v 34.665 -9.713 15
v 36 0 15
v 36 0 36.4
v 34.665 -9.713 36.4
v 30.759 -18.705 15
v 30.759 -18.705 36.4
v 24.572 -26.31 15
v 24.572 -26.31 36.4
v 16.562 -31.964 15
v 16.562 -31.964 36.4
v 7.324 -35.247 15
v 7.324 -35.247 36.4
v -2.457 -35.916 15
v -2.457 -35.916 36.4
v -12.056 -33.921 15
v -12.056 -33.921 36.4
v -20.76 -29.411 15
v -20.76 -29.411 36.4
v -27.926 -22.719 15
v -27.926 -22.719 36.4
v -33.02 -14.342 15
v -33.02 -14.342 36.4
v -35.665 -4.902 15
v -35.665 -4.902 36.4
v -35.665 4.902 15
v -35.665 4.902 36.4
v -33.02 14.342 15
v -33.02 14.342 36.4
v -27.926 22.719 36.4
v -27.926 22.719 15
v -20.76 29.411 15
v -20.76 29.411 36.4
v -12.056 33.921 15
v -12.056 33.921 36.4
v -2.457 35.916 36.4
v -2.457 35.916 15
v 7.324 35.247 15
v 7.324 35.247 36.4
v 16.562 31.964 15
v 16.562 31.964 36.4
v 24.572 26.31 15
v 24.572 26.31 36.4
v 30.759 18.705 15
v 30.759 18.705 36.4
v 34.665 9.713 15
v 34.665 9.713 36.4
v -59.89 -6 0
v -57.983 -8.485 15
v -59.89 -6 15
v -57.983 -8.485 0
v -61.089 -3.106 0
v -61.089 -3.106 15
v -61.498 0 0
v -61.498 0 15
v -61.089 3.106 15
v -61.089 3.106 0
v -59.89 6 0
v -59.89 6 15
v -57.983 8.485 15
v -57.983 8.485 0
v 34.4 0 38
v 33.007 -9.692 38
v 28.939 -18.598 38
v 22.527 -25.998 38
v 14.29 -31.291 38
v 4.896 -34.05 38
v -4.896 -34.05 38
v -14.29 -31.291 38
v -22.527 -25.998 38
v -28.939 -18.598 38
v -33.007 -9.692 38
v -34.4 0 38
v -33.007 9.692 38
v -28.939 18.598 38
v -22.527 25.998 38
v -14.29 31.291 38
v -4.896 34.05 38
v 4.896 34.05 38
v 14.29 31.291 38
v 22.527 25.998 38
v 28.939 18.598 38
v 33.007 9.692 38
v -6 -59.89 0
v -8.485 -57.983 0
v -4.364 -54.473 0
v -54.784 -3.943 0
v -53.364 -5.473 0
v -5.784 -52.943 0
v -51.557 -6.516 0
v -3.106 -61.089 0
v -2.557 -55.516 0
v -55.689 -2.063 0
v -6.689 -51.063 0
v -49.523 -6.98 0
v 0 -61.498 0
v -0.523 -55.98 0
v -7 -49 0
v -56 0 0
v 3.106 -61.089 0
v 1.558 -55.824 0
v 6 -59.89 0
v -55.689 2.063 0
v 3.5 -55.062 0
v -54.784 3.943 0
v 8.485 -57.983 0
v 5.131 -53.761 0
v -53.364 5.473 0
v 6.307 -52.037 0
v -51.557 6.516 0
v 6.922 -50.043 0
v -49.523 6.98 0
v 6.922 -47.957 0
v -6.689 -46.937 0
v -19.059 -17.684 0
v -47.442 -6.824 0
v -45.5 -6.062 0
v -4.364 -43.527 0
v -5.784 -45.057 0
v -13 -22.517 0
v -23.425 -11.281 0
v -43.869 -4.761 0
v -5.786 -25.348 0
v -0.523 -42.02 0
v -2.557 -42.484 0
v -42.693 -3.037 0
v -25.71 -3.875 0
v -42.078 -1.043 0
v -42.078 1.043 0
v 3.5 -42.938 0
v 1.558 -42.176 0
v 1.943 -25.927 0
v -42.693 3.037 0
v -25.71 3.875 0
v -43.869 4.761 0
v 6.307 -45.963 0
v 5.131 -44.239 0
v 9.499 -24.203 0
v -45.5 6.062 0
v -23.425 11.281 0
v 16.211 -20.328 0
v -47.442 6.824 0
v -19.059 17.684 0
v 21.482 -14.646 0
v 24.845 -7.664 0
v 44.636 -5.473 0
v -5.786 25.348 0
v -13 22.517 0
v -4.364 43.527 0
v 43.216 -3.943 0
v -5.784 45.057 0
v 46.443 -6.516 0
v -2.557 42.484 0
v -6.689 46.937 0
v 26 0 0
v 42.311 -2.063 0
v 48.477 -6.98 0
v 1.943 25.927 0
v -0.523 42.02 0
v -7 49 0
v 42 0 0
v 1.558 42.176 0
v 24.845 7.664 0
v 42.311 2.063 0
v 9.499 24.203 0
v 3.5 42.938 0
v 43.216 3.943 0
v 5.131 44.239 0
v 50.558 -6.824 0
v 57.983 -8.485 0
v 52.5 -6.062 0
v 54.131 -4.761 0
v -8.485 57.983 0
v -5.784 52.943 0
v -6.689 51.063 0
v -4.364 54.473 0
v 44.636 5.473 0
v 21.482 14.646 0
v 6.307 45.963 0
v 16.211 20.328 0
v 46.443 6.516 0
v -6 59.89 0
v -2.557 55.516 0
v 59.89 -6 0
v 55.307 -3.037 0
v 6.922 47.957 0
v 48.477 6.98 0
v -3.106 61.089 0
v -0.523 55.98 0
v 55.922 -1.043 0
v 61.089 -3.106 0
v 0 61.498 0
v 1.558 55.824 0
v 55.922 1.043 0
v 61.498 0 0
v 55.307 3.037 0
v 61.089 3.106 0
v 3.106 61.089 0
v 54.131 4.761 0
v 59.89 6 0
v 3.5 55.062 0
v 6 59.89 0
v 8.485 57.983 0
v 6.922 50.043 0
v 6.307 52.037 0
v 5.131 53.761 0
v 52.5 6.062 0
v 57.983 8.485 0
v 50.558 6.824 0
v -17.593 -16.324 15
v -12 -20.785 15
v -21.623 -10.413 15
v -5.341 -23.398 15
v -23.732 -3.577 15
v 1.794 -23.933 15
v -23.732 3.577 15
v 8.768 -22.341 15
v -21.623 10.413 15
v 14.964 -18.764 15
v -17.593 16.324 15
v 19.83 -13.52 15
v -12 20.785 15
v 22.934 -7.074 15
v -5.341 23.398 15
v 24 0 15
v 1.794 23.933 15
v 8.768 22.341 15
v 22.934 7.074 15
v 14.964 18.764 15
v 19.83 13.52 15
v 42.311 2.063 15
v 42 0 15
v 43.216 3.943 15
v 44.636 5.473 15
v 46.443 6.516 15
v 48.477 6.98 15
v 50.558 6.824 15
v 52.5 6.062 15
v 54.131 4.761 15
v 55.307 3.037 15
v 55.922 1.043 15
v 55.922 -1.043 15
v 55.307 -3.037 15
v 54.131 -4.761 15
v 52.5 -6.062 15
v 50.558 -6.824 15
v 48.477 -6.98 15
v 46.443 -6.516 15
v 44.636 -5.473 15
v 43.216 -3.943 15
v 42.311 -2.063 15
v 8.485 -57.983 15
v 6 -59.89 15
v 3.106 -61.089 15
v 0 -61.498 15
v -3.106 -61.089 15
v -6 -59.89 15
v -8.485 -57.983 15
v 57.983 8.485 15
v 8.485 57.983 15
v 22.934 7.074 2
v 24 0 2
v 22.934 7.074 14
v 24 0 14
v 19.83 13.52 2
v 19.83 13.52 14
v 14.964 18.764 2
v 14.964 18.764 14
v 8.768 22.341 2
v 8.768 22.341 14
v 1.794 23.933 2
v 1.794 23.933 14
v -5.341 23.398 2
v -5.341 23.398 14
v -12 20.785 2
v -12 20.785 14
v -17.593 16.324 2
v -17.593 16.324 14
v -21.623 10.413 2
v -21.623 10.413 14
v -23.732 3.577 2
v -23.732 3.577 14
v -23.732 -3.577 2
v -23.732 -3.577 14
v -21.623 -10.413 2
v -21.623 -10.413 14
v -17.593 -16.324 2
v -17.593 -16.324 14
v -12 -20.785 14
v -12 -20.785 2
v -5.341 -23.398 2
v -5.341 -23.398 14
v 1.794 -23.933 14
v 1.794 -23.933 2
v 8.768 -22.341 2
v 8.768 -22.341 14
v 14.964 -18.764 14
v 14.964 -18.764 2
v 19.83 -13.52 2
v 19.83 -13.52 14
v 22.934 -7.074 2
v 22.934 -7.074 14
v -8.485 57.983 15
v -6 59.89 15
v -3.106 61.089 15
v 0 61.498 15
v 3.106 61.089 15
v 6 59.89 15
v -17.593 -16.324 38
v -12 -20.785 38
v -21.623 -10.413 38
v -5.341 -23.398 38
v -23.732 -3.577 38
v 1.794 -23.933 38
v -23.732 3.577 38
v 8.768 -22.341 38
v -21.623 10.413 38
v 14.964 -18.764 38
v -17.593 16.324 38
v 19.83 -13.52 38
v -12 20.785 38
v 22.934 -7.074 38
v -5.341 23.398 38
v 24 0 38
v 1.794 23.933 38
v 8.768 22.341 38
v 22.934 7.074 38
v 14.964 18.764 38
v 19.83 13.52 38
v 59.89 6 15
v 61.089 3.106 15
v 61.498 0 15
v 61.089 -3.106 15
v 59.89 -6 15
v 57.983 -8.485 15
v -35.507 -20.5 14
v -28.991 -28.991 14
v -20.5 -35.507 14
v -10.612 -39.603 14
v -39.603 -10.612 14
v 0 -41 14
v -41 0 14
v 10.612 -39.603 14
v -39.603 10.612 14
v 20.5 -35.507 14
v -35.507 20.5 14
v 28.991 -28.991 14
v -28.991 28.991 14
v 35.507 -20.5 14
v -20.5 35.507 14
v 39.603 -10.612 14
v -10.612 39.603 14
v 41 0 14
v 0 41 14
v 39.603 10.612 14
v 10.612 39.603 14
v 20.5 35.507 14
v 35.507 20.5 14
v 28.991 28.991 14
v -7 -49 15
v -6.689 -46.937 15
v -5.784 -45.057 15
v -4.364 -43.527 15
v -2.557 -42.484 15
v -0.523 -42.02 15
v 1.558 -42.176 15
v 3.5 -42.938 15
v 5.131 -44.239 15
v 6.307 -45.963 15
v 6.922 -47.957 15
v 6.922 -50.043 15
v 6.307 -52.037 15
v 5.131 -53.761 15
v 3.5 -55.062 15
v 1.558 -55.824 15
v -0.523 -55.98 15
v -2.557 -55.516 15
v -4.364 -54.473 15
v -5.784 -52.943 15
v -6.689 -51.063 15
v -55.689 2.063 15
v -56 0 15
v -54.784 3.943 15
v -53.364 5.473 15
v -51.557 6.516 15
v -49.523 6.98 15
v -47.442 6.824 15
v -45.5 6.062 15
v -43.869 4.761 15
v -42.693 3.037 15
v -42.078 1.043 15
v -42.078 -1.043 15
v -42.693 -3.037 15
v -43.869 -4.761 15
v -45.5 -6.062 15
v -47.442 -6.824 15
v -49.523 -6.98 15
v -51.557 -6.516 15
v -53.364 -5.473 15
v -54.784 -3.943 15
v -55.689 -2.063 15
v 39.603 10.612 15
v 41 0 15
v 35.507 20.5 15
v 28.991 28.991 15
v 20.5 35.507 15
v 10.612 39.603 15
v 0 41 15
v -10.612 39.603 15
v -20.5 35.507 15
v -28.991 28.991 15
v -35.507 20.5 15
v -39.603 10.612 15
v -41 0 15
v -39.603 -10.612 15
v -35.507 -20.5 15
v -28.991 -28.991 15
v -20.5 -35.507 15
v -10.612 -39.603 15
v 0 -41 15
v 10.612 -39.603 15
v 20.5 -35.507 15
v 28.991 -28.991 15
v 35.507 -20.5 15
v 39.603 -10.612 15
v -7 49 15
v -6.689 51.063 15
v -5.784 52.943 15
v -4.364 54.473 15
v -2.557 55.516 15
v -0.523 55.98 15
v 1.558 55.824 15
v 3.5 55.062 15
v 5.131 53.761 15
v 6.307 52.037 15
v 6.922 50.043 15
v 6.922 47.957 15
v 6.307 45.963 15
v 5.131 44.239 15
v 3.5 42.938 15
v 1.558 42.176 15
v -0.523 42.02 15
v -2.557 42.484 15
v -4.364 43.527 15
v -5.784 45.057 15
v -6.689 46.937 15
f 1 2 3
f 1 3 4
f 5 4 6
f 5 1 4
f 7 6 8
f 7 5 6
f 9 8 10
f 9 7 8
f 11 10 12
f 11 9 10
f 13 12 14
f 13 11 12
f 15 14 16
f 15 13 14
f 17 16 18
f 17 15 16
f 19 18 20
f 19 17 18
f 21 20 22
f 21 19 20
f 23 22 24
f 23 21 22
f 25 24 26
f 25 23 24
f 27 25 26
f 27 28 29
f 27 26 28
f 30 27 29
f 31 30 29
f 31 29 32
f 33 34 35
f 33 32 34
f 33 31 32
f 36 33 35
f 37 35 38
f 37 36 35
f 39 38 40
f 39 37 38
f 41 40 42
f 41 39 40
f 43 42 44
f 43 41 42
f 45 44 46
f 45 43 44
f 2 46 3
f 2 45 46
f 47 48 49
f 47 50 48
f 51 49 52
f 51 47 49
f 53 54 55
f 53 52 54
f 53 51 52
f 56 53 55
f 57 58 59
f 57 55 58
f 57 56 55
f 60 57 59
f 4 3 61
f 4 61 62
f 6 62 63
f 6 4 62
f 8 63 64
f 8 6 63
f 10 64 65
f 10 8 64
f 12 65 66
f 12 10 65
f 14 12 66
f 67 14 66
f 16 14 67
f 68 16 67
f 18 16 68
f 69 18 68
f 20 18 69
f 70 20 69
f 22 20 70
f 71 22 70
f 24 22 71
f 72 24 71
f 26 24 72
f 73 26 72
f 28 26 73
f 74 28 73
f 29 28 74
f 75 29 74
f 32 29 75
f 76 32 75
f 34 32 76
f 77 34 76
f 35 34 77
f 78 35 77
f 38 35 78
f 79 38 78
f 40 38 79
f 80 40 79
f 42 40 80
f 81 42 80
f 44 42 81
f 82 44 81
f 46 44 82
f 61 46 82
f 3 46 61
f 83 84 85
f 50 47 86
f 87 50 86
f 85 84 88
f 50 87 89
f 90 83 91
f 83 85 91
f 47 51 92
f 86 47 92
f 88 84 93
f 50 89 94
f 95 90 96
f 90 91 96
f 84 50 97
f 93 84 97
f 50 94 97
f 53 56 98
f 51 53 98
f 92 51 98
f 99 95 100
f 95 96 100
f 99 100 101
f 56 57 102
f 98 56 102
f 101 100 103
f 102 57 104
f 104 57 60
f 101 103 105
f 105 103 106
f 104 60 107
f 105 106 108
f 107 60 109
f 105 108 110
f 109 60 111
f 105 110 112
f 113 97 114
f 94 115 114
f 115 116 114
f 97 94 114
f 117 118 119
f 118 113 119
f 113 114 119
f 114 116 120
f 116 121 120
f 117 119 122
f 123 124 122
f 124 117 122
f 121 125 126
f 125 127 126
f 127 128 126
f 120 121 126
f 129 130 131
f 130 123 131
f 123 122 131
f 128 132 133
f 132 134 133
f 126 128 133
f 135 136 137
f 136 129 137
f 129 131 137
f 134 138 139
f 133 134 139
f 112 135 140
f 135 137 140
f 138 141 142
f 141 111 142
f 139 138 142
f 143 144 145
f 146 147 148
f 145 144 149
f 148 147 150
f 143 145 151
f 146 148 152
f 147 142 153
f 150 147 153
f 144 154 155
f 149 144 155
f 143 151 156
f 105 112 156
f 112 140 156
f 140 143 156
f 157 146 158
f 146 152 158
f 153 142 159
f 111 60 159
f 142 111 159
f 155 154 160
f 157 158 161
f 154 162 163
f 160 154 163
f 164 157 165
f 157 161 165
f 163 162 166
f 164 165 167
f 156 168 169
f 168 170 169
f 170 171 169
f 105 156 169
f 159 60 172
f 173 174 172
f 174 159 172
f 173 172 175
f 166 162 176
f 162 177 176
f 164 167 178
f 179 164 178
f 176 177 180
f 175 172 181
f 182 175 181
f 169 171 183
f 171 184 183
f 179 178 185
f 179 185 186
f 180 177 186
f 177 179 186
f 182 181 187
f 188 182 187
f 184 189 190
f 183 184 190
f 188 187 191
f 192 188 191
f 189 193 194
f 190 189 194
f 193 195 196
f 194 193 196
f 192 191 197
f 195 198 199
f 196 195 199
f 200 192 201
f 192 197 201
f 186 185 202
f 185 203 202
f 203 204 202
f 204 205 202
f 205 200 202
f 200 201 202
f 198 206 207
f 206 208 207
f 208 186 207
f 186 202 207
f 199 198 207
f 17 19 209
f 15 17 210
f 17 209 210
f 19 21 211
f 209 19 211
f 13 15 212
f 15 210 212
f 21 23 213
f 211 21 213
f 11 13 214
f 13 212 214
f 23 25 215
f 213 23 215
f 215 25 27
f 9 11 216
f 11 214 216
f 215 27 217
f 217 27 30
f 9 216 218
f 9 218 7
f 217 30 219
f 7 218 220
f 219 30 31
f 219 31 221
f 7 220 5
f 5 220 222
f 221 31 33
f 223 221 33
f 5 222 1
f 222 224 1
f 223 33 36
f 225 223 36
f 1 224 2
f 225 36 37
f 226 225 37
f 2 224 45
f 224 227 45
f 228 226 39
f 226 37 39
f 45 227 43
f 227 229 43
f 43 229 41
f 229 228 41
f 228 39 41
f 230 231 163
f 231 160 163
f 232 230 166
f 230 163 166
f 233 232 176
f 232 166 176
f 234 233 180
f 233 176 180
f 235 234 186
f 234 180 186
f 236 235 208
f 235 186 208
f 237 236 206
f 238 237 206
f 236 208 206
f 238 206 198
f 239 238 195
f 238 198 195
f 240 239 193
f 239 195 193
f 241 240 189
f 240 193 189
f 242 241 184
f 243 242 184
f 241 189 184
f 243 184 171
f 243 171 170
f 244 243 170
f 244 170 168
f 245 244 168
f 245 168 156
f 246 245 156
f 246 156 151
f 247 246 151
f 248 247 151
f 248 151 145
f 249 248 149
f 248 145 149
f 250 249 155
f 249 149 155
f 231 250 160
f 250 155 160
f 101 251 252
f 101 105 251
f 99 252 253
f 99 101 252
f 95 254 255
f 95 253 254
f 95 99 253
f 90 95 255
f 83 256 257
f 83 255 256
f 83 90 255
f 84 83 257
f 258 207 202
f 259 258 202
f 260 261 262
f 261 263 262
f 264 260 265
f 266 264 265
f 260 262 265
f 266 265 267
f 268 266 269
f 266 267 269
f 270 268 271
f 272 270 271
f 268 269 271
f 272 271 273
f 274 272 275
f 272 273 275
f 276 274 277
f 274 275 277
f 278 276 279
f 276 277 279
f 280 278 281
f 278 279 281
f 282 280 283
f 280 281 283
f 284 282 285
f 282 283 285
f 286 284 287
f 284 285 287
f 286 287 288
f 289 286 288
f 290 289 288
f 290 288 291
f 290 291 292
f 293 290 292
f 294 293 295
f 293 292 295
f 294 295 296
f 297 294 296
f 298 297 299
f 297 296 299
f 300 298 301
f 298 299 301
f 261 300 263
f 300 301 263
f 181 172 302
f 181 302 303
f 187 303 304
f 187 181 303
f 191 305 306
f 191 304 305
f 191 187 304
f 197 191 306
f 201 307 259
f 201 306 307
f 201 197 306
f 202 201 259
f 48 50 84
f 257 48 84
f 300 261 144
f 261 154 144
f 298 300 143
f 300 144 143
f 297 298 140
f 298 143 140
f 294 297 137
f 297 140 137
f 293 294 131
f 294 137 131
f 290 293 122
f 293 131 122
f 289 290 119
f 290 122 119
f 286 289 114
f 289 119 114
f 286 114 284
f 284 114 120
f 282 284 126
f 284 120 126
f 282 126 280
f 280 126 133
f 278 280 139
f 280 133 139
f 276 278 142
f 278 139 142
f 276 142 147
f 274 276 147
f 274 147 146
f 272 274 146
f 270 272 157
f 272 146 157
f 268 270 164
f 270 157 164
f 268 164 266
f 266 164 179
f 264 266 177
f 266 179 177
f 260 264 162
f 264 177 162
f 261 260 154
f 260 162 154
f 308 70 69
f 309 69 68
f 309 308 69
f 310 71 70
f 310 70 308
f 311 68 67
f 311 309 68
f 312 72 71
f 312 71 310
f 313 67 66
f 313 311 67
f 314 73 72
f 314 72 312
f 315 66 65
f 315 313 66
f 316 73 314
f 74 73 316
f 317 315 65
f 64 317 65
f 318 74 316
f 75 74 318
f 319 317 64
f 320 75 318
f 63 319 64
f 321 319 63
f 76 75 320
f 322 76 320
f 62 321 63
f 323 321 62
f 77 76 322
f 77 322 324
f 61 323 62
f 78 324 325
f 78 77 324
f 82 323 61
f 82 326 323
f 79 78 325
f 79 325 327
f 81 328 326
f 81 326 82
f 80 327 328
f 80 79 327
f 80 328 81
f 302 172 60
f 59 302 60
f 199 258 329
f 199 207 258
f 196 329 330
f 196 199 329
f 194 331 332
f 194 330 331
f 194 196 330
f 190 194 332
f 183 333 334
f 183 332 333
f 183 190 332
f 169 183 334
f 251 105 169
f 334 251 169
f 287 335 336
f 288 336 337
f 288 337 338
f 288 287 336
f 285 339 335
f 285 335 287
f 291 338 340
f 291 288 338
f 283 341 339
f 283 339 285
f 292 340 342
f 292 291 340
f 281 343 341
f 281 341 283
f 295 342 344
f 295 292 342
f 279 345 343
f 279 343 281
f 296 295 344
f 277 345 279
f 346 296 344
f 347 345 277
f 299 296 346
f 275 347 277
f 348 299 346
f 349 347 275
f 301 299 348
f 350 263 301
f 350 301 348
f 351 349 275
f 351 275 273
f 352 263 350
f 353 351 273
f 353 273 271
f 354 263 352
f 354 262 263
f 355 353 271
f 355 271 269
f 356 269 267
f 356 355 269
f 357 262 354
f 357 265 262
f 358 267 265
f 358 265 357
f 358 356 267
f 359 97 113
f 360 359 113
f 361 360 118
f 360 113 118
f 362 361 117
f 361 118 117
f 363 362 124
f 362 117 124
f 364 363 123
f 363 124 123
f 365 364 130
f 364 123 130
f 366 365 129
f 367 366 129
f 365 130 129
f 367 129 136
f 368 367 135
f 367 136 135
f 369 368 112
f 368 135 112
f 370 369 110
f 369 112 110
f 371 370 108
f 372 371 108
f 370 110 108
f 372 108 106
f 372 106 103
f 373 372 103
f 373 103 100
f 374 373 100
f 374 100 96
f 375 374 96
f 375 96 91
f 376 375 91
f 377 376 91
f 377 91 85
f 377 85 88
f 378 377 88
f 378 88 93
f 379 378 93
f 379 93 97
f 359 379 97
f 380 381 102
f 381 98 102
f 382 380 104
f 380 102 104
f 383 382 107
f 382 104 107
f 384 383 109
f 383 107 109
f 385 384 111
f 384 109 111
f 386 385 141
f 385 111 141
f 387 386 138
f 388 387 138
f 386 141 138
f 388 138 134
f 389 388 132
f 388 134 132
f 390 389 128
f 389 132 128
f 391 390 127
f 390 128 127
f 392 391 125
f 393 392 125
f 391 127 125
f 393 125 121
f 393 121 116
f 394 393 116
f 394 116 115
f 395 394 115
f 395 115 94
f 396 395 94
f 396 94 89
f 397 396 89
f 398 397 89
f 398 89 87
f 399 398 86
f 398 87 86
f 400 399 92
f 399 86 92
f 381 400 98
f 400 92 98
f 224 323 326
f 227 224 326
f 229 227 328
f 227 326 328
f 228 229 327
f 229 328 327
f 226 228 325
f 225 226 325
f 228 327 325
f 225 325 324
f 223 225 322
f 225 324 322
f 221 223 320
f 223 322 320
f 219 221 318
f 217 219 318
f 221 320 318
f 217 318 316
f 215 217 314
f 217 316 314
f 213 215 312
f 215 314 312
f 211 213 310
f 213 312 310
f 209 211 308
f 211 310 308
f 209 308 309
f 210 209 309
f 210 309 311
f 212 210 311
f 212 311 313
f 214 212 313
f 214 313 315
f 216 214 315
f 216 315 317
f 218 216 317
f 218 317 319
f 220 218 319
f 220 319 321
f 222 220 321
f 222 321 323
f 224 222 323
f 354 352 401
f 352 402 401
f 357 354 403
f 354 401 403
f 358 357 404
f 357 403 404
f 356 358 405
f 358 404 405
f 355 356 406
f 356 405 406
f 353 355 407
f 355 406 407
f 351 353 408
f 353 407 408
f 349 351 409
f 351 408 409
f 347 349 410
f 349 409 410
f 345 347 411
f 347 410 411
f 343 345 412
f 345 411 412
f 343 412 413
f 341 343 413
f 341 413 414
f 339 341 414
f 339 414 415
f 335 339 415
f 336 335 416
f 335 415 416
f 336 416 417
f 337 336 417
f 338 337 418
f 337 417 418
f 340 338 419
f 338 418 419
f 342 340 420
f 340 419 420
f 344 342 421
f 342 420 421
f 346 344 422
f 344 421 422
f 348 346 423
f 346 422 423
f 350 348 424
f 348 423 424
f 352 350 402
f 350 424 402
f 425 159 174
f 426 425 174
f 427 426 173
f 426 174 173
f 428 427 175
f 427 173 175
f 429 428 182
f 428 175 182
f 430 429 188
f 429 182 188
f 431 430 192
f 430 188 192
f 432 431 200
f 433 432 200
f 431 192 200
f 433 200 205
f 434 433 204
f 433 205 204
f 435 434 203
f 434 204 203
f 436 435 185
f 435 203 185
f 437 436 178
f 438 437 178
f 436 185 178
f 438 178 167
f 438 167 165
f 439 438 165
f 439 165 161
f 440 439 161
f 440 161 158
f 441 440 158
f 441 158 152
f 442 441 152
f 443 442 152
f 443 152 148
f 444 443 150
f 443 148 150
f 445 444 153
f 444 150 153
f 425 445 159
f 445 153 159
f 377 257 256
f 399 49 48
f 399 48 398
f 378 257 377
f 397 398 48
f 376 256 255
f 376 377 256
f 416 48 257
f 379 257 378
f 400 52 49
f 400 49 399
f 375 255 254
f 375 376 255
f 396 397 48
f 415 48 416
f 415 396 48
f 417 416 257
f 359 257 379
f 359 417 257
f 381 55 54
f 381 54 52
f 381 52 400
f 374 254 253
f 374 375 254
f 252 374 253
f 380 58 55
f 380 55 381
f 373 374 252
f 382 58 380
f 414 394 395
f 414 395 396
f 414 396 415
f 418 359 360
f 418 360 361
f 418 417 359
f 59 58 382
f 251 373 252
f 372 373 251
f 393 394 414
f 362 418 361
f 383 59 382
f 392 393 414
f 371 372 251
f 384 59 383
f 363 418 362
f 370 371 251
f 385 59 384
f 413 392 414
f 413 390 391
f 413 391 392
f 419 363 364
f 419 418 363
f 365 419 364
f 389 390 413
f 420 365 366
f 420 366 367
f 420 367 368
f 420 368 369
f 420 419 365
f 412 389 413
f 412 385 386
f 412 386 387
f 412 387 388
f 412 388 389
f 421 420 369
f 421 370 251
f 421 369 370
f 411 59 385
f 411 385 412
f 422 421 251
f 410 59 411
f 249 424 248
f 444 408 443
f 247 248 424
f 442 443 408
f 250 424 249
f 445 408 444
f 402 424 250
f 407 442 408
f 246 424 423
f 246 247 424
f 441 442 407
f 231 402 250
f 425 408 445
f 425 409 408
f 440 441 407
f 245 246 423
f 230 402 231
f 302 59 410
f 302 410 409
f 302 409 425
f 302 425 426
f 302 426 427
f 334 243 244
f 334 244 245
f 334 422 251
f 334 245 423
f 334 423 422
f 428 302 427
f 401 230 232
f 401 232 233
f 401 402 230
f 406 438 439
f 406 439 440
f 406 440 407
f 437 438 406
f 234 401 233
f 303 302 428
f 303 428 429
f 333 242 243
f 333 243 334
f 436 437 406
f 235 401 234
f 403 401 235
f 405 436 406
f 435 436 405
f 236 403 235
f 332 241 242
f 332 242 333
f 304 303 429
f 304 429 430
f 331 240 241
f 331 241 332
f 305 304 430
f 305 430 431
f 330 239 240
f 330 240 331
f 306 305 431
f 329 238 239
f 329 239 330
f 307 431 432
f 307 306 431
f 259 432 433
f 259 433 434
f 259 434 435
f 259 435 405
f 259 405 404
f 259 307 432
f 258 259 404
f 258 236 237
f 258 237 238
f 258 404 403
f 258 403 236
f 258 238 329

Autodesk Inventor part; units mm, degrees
ref_plane "YZ Plane" through (0, 0, 0) normal (1, 0, 0) x (0, 1, 0)
ref_plane "XZ Plane" through (0, 0, 0) normal (0, 1, 0) x (-1, 0, 0)
ref_plane "XY Plane" through (0, 0, 0) normal (0, 0, 1) x (1, 0, 0)
sketch "Эскиз1" plane through (0, 0, 0) normal (0, 0, 1) x (1, 0, 0)
  line L0 (-8.4853, 57.9828) -> (-57.9828, 8.4853)
  line L1 (-57.9828, -8.4853) -> (-8.4853, -57.9828)
  line L2 (8.4853, -57.9828) -> (57.9828, -8.4853)
  line L3 (57.9828, 8.4853) -> (8.4853, 57.9828)
  arc A0 (8.4853, 57.9828) -> (-8.4853, 57.9828) centre (0, 49.4975) ccw
  arc A1 (57.9828, -8.4853) -> (57.9828, 8.4853) centre (49.4975, 0) ccw
  arc A2 (-57.9828, 8.4853) -> (-57.9828, -8.4853) centre (-49.4975, 0) ccw
  arc A3 (-8.4853, -57.9828) -> (8.4853, -57.9828) centre (0, -49.4975) ccw
  point P0 (0, 0)
  point P1 (0, 66.468)
  point P2 (-66.468, 0)
  point P3 (0, -66.468)
  point P4 (66.468, 0)
  dimension "d0" = 94
  dimension "d1" = 47
  dimension "d2" = 47
  dimension "d3" = 12
extrude "Выдавливание1" add sketch "Эскиз1" along normal blind 15
sketch "Эскиз2" plane through (0, 0, 15) normal (0, 0, 1) x (1, 0, 0)
  circle A0 centre (0, 0) radius 36
  dimension "d6" = 72
extrude "Выдавливание2" add sketch "Эскиз2" along normal blind 23
sketch "Эскиз3" plane through (0, 0, 38) normal (0, 0, 1) x (1, 0, 0)
  circle A0 centre (0, 0) radius 24
  dimension "d9" = 48
extrude "Выдавливание3" cut sketch "Эскиз3" against normal blind 38
chamfer "Фаска1" distance 1.6 angle 45 1 edges at (-36, 0, 38)
chamfer "Фаска2" distance 2 angle 45 1 edges at (-24, 0, 0)
sketch "Эскиз4" plane through (0, 0, 0) normal (0, 0, -1) x (-1, 0, 0)
  circle A0 centre (0, 49) radius 7
  circle A1 centre (49, 0) radius 7
  circle A2 centre (0, -49) radius 7
  circle A3 centre (-49, 0) radius 7
  line L0 (0, -86.0965) -> (0, 86.0965) projected
  line L1 (86.0965, 0) -> (-86.0965, 0) projected
  point P0 (0, 0)
  dimension "d18" = 98
  dimension "d19" = 98
  dimension "d20" = 14
  dimension "d21" = 14
  dimension "d22" = 14
  dimension "d23" = 14
extrude "Выдавливание4" cut sketch "Эскиз4" against normal blind 15
sketch "Эскиз5" plane through (0, 0, 15) normal (0, 0, 1) x (1, 0, 0)
  circle A0 centre (0, 0) radius 41
  dimension "d26" = 82
extrude "Выдавливание5" cut sketch "Эскиз5" against normal blind 1
